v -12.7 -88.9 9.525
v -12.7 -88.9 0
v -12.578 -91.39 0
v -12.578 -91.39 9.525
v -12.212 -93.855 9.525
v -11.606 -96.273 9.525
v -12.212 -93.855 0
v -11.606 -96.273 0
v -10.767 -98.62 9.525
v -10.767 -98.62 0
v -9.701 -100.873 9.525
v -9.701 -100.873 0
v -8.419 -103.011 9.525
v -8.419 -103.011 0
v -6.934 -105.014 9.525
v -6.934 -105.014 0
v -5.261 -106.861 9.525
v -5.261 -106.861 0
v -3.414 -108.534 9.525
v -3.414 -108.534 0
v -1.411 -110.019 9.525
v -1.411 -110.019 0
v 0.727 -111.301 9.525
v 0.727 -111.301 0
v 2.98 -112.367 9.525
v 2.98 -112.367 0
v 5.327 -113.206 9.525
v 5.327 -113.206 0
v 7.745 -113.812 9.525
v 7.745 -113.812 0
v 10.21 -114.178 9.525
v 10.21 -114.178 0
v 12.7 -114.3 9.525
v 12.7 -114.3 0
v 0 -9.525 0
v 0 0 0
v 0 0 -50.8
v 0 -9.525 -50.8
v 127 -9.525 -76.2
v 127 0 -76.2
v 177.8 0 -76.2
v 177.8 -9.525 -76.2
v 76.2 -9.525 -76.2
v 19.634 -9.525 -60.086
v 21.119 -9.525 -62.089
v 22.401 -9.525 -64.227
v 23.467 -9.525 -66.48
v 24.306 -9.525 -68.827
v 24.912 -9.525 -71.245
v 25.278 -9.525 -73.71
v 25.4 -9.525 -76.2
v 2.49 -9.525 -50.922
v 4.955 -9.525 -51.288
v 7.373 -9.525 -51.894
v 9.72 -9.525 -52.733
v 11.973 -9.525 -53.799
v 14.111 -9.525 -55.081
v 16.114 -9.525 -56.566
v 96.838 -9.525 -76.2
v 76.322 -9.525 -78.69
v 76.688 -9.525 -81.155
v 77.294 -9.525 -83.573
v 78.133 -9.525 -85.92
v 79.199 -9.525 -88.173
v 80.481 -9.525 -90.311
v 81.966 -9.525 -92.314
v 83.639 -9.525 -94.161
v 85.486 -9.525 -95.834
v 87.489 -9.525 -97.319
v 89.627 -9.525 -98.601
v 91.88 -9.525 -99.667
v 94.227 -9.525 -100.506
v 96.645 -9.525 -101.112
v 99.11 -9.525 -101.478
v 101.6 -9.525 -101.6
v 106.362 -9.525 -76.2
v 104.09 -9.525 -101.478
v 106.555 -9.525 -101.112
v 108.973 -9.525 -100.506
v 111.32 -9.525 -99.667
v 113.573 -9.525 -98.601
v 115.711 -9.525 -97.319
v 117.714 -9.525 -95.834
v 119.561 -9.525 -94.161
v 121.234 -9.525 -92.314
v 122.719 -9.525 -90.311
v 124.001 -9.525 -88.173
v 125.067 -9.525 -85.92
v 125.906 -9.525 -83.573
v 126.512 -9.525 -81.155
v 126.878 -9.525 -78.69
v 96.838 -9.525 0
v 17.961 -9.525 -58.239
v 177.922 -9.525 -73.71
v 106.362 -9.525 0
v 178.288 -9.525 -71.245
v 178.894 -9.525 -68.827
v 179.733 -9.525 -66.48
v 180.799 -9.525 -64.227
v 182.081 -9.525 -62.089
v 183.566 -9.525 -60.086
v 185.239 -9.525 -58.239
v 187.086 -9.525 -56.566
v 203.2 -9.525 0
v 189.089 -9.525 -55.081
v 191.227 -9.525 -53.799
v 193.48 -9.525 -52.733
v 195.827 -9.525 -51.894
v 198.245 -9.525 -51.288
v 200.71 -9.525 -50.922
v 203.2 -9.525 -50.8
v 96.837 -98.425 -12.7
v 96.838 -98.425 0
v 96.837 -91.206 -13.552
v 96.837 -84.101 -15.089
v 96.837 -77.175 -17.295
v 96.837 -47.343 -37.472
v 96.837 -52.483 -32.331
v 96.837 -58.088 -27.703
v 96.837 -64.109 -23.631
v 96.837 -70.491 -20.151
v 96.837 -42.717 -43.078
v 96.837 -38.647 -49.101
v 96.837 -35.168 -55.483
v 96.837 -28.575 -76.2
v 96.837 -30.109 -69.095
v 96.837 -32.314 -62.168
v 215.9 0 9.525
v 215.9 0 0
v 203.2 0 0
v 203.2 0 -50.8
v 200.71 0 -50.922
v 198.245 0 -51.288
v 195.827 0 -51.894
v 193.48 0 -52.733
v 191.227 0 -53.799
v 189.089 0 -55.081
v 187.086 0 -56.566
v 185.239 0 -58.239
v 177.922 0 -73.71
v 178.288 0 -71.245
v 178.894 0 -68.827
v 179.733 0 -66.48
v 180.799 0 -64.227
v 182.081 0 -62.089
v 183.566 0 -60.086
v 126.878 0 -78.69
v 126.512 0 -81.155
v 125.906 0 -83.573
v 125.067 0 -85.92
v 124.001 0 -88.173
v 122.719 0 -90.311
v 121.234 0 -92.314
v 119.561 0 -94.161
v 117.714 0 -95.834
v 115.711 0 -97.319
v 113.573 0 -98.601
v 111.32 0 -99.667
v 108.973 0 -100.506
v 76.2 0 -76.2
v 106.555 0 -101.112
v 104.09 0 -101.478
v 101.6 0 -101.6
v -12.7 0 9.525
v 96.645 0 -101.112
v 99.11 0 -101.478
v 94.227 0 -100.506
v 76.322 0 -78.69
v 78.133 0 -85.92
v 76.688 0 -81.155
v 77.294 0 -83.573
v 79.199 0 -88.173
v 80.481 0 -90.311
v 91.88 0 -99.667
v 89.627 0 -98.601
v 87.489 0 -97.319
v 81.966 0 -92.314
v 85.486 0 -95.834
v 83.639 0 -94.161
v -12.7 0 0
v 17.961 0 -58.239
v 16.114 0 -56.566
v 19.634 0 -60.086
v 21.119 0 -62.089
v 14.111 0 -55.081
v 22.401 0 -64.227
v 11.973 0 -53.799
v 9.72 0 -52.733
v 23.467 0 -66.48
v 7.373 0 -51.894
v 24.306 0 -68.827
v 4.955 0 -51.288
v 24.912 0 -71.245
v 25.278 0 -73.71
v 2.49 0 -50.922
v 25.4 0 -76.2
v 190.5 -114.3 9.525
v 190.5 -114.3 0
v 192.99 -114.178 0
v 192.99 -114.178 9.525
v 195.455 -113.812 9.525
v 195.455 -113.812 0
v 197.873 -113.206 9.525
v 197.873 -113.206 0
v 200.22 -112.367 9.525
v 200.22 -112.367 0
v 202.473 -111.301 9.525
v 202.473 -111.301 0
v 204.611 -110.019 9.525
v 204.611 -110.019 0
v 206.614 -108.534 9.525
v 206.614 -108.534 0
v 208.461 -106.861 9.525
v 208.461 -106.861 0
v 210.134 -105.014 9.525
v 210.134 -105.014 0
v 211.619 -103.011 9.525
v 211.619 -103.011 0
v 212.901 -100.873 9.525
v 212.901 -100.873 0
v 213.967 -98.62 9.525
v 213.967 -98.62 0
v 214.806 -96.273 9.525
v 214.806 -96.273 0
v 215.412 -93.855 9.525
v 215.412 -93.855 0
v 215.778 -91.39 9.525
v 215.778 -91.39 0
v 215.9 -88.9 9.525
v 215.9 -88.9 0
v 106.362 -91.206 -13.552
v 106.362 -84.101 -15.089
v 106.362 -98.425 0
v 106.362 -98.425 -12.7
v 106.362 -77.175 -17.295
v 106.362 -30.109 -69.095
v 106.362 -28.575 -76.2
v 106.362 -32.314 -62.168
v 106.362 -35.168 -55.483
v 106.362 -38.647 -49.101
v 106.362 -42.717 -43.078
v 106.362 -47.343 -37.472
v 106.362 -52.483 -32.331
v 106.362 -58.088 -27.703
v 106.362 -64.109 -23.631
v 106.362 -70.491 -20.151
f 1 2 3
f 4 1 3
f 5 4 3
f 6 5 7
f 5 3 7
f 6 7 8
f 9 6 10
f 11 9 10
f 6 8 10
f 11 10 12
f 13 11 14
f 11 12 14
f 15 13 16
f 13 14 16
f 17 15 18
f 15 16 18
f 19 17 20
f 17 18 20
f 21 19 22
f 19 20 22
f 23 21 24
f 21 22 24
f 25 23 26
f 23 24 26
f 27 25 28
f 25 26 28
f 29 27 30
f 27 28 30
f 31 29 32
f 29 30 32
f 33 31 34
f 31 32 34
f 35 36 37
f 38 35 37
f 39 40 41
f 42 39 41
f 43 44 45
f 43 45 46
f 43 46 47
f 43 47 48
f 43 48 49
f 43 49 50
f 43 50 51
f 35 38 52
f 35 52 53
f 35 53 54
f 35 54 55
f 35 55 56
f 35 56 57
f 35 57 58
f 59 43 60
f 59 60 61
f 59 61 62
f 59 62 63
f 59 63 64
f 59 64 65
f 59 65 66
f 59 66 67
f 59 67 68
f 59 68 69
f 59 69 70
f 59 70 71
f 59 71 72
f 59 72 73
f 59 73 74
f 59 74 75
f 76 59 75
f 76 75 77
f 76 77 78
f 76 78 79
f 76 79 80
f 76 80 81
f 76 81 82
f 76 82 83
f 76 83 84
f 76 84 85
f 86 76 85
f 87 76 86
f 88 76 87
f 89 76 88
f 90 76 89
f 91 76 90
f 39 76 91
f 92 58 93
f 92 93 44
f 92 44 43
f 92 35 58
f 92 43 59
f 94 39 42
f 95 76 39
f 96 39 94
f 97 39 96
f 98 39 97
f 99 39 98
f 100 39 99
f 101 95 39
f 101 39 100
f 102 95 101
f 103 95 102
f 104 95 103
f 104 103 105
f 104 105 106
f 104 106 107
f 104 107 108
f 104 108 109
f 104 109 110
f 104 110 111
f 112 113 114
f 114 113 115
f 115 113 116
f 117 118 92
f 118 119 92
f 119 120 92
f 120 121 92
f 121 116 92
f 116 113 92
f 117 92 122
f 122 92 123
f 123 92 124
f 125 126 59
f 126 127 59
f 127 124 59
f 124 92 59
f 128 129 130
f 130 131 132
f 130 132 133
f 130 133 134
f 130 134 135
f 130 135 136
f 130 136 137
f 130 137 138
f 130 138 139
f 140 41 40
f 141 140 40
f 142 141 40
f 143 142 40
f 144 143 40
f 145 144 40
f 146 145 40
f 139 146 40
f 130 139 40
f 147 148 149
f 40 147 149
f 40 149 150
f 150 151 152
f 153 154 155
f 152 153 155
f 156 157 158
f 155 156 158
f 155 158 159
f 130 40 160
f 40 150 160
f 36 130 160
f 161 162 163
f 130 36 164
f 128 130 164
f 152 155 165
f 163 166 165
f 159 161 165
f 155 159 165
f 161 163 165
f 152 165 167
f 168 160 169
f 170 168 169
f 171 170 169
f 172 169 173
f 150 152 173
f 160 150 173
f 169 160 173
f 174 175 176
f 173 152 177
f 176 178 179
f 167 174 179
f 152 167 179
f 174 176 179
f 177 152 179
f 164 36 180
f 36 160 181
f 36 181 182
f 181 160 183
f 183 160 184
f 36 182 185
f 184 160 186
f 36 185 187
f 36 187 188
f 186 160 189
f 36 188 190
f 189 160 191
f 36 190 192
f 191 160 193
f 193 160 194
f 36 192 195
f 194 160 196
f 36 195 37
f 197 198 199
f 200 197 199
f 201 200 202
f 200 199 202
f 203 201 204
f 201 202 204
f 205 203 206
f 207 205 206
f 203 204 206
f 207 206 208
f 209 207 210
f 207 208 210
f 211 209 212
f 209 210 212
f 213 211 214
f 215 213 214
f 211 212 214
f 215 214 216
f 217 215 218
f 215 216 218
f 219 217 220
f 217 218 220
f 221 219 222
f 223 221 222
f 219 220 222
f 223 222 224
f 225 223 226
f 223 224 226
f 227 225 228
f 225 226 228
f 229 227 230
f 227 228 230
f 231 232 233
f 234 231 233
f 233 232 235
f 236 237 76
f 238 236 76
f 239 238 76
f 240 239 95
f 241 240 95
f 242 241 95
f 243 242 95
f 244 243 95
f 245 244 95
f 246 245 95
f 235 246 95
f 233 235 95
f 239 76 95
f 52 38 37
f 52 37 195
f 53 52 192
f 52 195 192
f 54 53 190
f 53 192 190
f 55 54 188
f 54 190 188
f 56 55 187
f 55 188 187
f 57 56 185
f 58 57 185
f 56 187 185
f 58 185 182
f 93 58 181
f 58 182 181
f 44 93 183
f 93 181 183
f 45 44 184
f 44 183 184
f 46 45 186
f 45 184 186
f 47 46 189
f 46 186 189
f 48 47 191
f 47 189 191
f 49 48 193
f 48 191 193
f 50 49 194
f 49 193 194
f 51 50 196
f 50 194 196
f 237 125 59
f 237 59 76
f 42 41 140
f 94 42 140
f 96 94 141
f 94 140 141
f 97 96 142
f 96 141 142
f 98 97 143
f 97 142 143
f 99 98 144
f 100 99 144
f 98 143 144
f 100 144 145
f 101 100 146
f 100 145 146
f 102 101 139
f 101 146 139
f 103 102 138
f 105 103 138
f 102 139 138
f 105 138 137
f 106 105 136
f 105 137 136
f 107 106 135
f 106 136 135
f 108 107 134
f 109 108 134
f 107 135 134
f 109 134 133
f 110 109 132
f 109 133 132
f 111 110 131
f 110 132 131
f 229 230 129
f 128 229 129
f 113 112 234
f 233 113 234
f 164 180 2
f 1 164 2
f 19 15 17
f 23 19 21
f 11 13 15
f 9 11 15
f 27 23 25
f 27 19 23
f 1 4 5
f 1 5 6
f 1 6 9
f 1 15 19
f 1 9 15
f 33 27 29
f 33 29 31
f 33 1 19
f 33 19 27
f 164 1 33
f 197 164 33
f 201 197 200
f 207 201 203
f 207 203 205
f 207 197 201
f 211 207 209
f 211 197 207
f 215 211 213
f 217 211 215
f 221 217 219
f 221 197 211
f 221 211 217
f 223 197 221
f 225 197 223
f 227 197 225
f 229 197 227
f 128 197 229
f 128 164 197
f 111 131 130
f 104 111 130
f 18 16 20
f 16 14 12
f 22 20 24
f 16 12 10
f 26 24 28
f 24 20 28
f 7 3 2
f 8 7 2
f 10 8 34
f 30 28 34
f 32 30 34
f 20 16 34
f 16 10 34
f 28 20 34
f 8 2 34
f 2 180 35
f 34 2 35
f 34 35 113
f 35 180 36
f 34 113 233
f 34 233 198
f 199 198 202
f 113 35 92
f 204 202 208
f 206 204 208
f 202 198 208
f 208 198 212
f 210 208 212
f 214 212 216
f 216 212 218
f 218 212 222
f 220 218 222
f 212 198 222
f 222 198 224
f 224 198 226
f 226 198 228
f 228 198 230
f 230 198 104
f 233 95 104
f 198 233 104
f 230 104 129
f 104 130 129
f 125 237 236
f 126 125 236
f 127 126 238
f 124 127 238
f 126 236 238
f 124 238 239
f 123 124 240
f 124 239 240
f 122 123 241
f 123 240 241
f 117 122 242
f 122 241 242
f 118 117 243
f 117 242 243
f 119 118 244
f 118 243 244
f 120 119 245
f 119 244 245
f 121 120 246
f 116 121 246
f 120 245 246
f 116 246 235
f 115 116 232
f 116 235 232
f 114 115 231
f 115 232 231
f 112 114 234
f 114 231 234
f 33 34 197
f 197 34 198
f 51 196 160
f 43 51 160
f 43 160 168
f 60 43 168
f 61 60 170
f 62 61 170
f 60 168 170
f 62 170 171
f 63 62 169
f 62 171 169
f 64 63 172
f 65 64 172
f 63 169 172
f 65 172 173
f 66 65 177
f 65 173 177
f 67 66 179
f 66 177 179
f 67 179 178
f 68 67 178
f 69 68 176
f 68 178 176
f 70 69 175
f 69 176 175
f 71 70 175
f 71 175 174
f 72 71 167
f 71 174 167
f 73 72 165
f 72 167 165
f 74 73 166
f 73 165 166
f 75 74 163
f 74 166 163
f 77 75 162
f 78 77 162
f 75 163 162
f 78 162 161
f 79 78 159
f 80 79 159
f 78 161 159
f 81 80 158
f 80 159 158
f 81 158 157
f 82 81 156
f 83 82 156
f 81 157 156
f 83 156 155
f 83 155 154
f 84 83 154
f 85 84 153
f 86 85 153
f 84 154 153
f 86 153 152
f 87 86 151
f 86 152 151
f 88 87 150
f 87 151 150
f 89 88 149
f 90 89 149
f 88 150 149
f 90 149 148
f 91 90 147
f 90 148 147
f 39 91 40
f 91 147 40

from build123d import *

# Parameters (mm, degrees)
F1_DEPTH = 9.525
F3_DEPTH = 88.9
F5_DEPTH = 9.525
F7_DEPTH = 9.525


# Not quite as in the source:
# - a length typed as a fraction of an inch, garbled in the dataset ("3 / 203.2 mm" for 3/8 in), is restored


with BuildPart() as f1:
    # F0 (on Front) → F1 (new body)
    with BuildSketch(Plane.XZ):
        with BuildLine():
            Line((203.2, 0), (0, 0))
            Line((0, 0), (0, -50.8))
            ThreePointArc((0, -50.8), (17.9605122421, -58.2394877579), (25.4, -76.2))
            Line((25.4, -76.2), (76.2, -76.2))
            ThreePointArc((76.2, -76.2), (101.6, -101.6), (127, -76.2))
            Line((127, -76.2), (177.8, -76.2))
            ThreePointArc((177.8, -76.2), (185.2394877579, -58.2394877579), (203.2, -50.8))
            Line((203.2, -50.8), (203.2, 0))
        make_face()
    extrude(amount=F1_DEPTH)

    # F2 (on face) → F3 (join)
    with BuildSketch(Plane.XZ.offset(9.525)):
        Polygon((96.8375, 0), (96.8375, -76.2), (101.6, -76.2), (106.3625, -76.2), (106.3625, 0), align=None)
    extrude(amount=F3_DEPTH)

    # F4 (on face) → F5 (cut)
    with BuildSketch(Plane.YZ.offset(106.3625)):
        with BuildLine():
            Line((-98.425, -76.2), (-28.575, -76.2))
            ThreePointArc((-28.575, -76.2), (-52.4826849385, -32.3309534324), (-98.425, -12.7))
            Line((-98.425, -12.7), (-98.425, -76.2))
        make_face()
    extrude(amount=-F5_DEPTH, mode=Mode.SUBTRACT)

    # F6 (on face) → F7 (join)
    with BuildSketch(Plane.XY):
        with BuildLine():
            Line((0, -9.525), (0, 0))
            Line((0, 0), (-12.7, 0))
            Line((-12.7, 0), (-12.7, -88.9))
            ThreePointArc((-12.7, -88.9), (-5.2605122421, -106.8605122421), (12.7, -114.3))
            Line((12.7, -114.3), (190.5, -114.3))
            ThreePointArc((190.5, -114.3), (208.4605122421, -106.8605122421), (215.9, -88.9))
            Line((215.9, -88.9), (215.9, 0))
            Line((215.9, 0), (203.2, 0))
            Line((203.2, 0), (203.2, -9.525))
            Line((203.2, -9.525), (106.3625, -9.525))
            Line((106.3625, -9.525), (106.3625, -98.425))
            Line((106.3625, -98.425), (96.8375, -98.425))
            Line((96.8375, -98.425), (96.8375, -9.525))
            Line((96.8375, -9.525), (0, -9.525))
        make_face()
        Polygon((203.2, 0), (0, 0), (0, -9.525), (96.8375, -9.525), (96.8375, -98.425), (106.3625, -98.425), (106.3625, -9.525), (203.2, -9.525), align=None)
    extrude(amount=F7_DEPTH)


solid = f1.part
